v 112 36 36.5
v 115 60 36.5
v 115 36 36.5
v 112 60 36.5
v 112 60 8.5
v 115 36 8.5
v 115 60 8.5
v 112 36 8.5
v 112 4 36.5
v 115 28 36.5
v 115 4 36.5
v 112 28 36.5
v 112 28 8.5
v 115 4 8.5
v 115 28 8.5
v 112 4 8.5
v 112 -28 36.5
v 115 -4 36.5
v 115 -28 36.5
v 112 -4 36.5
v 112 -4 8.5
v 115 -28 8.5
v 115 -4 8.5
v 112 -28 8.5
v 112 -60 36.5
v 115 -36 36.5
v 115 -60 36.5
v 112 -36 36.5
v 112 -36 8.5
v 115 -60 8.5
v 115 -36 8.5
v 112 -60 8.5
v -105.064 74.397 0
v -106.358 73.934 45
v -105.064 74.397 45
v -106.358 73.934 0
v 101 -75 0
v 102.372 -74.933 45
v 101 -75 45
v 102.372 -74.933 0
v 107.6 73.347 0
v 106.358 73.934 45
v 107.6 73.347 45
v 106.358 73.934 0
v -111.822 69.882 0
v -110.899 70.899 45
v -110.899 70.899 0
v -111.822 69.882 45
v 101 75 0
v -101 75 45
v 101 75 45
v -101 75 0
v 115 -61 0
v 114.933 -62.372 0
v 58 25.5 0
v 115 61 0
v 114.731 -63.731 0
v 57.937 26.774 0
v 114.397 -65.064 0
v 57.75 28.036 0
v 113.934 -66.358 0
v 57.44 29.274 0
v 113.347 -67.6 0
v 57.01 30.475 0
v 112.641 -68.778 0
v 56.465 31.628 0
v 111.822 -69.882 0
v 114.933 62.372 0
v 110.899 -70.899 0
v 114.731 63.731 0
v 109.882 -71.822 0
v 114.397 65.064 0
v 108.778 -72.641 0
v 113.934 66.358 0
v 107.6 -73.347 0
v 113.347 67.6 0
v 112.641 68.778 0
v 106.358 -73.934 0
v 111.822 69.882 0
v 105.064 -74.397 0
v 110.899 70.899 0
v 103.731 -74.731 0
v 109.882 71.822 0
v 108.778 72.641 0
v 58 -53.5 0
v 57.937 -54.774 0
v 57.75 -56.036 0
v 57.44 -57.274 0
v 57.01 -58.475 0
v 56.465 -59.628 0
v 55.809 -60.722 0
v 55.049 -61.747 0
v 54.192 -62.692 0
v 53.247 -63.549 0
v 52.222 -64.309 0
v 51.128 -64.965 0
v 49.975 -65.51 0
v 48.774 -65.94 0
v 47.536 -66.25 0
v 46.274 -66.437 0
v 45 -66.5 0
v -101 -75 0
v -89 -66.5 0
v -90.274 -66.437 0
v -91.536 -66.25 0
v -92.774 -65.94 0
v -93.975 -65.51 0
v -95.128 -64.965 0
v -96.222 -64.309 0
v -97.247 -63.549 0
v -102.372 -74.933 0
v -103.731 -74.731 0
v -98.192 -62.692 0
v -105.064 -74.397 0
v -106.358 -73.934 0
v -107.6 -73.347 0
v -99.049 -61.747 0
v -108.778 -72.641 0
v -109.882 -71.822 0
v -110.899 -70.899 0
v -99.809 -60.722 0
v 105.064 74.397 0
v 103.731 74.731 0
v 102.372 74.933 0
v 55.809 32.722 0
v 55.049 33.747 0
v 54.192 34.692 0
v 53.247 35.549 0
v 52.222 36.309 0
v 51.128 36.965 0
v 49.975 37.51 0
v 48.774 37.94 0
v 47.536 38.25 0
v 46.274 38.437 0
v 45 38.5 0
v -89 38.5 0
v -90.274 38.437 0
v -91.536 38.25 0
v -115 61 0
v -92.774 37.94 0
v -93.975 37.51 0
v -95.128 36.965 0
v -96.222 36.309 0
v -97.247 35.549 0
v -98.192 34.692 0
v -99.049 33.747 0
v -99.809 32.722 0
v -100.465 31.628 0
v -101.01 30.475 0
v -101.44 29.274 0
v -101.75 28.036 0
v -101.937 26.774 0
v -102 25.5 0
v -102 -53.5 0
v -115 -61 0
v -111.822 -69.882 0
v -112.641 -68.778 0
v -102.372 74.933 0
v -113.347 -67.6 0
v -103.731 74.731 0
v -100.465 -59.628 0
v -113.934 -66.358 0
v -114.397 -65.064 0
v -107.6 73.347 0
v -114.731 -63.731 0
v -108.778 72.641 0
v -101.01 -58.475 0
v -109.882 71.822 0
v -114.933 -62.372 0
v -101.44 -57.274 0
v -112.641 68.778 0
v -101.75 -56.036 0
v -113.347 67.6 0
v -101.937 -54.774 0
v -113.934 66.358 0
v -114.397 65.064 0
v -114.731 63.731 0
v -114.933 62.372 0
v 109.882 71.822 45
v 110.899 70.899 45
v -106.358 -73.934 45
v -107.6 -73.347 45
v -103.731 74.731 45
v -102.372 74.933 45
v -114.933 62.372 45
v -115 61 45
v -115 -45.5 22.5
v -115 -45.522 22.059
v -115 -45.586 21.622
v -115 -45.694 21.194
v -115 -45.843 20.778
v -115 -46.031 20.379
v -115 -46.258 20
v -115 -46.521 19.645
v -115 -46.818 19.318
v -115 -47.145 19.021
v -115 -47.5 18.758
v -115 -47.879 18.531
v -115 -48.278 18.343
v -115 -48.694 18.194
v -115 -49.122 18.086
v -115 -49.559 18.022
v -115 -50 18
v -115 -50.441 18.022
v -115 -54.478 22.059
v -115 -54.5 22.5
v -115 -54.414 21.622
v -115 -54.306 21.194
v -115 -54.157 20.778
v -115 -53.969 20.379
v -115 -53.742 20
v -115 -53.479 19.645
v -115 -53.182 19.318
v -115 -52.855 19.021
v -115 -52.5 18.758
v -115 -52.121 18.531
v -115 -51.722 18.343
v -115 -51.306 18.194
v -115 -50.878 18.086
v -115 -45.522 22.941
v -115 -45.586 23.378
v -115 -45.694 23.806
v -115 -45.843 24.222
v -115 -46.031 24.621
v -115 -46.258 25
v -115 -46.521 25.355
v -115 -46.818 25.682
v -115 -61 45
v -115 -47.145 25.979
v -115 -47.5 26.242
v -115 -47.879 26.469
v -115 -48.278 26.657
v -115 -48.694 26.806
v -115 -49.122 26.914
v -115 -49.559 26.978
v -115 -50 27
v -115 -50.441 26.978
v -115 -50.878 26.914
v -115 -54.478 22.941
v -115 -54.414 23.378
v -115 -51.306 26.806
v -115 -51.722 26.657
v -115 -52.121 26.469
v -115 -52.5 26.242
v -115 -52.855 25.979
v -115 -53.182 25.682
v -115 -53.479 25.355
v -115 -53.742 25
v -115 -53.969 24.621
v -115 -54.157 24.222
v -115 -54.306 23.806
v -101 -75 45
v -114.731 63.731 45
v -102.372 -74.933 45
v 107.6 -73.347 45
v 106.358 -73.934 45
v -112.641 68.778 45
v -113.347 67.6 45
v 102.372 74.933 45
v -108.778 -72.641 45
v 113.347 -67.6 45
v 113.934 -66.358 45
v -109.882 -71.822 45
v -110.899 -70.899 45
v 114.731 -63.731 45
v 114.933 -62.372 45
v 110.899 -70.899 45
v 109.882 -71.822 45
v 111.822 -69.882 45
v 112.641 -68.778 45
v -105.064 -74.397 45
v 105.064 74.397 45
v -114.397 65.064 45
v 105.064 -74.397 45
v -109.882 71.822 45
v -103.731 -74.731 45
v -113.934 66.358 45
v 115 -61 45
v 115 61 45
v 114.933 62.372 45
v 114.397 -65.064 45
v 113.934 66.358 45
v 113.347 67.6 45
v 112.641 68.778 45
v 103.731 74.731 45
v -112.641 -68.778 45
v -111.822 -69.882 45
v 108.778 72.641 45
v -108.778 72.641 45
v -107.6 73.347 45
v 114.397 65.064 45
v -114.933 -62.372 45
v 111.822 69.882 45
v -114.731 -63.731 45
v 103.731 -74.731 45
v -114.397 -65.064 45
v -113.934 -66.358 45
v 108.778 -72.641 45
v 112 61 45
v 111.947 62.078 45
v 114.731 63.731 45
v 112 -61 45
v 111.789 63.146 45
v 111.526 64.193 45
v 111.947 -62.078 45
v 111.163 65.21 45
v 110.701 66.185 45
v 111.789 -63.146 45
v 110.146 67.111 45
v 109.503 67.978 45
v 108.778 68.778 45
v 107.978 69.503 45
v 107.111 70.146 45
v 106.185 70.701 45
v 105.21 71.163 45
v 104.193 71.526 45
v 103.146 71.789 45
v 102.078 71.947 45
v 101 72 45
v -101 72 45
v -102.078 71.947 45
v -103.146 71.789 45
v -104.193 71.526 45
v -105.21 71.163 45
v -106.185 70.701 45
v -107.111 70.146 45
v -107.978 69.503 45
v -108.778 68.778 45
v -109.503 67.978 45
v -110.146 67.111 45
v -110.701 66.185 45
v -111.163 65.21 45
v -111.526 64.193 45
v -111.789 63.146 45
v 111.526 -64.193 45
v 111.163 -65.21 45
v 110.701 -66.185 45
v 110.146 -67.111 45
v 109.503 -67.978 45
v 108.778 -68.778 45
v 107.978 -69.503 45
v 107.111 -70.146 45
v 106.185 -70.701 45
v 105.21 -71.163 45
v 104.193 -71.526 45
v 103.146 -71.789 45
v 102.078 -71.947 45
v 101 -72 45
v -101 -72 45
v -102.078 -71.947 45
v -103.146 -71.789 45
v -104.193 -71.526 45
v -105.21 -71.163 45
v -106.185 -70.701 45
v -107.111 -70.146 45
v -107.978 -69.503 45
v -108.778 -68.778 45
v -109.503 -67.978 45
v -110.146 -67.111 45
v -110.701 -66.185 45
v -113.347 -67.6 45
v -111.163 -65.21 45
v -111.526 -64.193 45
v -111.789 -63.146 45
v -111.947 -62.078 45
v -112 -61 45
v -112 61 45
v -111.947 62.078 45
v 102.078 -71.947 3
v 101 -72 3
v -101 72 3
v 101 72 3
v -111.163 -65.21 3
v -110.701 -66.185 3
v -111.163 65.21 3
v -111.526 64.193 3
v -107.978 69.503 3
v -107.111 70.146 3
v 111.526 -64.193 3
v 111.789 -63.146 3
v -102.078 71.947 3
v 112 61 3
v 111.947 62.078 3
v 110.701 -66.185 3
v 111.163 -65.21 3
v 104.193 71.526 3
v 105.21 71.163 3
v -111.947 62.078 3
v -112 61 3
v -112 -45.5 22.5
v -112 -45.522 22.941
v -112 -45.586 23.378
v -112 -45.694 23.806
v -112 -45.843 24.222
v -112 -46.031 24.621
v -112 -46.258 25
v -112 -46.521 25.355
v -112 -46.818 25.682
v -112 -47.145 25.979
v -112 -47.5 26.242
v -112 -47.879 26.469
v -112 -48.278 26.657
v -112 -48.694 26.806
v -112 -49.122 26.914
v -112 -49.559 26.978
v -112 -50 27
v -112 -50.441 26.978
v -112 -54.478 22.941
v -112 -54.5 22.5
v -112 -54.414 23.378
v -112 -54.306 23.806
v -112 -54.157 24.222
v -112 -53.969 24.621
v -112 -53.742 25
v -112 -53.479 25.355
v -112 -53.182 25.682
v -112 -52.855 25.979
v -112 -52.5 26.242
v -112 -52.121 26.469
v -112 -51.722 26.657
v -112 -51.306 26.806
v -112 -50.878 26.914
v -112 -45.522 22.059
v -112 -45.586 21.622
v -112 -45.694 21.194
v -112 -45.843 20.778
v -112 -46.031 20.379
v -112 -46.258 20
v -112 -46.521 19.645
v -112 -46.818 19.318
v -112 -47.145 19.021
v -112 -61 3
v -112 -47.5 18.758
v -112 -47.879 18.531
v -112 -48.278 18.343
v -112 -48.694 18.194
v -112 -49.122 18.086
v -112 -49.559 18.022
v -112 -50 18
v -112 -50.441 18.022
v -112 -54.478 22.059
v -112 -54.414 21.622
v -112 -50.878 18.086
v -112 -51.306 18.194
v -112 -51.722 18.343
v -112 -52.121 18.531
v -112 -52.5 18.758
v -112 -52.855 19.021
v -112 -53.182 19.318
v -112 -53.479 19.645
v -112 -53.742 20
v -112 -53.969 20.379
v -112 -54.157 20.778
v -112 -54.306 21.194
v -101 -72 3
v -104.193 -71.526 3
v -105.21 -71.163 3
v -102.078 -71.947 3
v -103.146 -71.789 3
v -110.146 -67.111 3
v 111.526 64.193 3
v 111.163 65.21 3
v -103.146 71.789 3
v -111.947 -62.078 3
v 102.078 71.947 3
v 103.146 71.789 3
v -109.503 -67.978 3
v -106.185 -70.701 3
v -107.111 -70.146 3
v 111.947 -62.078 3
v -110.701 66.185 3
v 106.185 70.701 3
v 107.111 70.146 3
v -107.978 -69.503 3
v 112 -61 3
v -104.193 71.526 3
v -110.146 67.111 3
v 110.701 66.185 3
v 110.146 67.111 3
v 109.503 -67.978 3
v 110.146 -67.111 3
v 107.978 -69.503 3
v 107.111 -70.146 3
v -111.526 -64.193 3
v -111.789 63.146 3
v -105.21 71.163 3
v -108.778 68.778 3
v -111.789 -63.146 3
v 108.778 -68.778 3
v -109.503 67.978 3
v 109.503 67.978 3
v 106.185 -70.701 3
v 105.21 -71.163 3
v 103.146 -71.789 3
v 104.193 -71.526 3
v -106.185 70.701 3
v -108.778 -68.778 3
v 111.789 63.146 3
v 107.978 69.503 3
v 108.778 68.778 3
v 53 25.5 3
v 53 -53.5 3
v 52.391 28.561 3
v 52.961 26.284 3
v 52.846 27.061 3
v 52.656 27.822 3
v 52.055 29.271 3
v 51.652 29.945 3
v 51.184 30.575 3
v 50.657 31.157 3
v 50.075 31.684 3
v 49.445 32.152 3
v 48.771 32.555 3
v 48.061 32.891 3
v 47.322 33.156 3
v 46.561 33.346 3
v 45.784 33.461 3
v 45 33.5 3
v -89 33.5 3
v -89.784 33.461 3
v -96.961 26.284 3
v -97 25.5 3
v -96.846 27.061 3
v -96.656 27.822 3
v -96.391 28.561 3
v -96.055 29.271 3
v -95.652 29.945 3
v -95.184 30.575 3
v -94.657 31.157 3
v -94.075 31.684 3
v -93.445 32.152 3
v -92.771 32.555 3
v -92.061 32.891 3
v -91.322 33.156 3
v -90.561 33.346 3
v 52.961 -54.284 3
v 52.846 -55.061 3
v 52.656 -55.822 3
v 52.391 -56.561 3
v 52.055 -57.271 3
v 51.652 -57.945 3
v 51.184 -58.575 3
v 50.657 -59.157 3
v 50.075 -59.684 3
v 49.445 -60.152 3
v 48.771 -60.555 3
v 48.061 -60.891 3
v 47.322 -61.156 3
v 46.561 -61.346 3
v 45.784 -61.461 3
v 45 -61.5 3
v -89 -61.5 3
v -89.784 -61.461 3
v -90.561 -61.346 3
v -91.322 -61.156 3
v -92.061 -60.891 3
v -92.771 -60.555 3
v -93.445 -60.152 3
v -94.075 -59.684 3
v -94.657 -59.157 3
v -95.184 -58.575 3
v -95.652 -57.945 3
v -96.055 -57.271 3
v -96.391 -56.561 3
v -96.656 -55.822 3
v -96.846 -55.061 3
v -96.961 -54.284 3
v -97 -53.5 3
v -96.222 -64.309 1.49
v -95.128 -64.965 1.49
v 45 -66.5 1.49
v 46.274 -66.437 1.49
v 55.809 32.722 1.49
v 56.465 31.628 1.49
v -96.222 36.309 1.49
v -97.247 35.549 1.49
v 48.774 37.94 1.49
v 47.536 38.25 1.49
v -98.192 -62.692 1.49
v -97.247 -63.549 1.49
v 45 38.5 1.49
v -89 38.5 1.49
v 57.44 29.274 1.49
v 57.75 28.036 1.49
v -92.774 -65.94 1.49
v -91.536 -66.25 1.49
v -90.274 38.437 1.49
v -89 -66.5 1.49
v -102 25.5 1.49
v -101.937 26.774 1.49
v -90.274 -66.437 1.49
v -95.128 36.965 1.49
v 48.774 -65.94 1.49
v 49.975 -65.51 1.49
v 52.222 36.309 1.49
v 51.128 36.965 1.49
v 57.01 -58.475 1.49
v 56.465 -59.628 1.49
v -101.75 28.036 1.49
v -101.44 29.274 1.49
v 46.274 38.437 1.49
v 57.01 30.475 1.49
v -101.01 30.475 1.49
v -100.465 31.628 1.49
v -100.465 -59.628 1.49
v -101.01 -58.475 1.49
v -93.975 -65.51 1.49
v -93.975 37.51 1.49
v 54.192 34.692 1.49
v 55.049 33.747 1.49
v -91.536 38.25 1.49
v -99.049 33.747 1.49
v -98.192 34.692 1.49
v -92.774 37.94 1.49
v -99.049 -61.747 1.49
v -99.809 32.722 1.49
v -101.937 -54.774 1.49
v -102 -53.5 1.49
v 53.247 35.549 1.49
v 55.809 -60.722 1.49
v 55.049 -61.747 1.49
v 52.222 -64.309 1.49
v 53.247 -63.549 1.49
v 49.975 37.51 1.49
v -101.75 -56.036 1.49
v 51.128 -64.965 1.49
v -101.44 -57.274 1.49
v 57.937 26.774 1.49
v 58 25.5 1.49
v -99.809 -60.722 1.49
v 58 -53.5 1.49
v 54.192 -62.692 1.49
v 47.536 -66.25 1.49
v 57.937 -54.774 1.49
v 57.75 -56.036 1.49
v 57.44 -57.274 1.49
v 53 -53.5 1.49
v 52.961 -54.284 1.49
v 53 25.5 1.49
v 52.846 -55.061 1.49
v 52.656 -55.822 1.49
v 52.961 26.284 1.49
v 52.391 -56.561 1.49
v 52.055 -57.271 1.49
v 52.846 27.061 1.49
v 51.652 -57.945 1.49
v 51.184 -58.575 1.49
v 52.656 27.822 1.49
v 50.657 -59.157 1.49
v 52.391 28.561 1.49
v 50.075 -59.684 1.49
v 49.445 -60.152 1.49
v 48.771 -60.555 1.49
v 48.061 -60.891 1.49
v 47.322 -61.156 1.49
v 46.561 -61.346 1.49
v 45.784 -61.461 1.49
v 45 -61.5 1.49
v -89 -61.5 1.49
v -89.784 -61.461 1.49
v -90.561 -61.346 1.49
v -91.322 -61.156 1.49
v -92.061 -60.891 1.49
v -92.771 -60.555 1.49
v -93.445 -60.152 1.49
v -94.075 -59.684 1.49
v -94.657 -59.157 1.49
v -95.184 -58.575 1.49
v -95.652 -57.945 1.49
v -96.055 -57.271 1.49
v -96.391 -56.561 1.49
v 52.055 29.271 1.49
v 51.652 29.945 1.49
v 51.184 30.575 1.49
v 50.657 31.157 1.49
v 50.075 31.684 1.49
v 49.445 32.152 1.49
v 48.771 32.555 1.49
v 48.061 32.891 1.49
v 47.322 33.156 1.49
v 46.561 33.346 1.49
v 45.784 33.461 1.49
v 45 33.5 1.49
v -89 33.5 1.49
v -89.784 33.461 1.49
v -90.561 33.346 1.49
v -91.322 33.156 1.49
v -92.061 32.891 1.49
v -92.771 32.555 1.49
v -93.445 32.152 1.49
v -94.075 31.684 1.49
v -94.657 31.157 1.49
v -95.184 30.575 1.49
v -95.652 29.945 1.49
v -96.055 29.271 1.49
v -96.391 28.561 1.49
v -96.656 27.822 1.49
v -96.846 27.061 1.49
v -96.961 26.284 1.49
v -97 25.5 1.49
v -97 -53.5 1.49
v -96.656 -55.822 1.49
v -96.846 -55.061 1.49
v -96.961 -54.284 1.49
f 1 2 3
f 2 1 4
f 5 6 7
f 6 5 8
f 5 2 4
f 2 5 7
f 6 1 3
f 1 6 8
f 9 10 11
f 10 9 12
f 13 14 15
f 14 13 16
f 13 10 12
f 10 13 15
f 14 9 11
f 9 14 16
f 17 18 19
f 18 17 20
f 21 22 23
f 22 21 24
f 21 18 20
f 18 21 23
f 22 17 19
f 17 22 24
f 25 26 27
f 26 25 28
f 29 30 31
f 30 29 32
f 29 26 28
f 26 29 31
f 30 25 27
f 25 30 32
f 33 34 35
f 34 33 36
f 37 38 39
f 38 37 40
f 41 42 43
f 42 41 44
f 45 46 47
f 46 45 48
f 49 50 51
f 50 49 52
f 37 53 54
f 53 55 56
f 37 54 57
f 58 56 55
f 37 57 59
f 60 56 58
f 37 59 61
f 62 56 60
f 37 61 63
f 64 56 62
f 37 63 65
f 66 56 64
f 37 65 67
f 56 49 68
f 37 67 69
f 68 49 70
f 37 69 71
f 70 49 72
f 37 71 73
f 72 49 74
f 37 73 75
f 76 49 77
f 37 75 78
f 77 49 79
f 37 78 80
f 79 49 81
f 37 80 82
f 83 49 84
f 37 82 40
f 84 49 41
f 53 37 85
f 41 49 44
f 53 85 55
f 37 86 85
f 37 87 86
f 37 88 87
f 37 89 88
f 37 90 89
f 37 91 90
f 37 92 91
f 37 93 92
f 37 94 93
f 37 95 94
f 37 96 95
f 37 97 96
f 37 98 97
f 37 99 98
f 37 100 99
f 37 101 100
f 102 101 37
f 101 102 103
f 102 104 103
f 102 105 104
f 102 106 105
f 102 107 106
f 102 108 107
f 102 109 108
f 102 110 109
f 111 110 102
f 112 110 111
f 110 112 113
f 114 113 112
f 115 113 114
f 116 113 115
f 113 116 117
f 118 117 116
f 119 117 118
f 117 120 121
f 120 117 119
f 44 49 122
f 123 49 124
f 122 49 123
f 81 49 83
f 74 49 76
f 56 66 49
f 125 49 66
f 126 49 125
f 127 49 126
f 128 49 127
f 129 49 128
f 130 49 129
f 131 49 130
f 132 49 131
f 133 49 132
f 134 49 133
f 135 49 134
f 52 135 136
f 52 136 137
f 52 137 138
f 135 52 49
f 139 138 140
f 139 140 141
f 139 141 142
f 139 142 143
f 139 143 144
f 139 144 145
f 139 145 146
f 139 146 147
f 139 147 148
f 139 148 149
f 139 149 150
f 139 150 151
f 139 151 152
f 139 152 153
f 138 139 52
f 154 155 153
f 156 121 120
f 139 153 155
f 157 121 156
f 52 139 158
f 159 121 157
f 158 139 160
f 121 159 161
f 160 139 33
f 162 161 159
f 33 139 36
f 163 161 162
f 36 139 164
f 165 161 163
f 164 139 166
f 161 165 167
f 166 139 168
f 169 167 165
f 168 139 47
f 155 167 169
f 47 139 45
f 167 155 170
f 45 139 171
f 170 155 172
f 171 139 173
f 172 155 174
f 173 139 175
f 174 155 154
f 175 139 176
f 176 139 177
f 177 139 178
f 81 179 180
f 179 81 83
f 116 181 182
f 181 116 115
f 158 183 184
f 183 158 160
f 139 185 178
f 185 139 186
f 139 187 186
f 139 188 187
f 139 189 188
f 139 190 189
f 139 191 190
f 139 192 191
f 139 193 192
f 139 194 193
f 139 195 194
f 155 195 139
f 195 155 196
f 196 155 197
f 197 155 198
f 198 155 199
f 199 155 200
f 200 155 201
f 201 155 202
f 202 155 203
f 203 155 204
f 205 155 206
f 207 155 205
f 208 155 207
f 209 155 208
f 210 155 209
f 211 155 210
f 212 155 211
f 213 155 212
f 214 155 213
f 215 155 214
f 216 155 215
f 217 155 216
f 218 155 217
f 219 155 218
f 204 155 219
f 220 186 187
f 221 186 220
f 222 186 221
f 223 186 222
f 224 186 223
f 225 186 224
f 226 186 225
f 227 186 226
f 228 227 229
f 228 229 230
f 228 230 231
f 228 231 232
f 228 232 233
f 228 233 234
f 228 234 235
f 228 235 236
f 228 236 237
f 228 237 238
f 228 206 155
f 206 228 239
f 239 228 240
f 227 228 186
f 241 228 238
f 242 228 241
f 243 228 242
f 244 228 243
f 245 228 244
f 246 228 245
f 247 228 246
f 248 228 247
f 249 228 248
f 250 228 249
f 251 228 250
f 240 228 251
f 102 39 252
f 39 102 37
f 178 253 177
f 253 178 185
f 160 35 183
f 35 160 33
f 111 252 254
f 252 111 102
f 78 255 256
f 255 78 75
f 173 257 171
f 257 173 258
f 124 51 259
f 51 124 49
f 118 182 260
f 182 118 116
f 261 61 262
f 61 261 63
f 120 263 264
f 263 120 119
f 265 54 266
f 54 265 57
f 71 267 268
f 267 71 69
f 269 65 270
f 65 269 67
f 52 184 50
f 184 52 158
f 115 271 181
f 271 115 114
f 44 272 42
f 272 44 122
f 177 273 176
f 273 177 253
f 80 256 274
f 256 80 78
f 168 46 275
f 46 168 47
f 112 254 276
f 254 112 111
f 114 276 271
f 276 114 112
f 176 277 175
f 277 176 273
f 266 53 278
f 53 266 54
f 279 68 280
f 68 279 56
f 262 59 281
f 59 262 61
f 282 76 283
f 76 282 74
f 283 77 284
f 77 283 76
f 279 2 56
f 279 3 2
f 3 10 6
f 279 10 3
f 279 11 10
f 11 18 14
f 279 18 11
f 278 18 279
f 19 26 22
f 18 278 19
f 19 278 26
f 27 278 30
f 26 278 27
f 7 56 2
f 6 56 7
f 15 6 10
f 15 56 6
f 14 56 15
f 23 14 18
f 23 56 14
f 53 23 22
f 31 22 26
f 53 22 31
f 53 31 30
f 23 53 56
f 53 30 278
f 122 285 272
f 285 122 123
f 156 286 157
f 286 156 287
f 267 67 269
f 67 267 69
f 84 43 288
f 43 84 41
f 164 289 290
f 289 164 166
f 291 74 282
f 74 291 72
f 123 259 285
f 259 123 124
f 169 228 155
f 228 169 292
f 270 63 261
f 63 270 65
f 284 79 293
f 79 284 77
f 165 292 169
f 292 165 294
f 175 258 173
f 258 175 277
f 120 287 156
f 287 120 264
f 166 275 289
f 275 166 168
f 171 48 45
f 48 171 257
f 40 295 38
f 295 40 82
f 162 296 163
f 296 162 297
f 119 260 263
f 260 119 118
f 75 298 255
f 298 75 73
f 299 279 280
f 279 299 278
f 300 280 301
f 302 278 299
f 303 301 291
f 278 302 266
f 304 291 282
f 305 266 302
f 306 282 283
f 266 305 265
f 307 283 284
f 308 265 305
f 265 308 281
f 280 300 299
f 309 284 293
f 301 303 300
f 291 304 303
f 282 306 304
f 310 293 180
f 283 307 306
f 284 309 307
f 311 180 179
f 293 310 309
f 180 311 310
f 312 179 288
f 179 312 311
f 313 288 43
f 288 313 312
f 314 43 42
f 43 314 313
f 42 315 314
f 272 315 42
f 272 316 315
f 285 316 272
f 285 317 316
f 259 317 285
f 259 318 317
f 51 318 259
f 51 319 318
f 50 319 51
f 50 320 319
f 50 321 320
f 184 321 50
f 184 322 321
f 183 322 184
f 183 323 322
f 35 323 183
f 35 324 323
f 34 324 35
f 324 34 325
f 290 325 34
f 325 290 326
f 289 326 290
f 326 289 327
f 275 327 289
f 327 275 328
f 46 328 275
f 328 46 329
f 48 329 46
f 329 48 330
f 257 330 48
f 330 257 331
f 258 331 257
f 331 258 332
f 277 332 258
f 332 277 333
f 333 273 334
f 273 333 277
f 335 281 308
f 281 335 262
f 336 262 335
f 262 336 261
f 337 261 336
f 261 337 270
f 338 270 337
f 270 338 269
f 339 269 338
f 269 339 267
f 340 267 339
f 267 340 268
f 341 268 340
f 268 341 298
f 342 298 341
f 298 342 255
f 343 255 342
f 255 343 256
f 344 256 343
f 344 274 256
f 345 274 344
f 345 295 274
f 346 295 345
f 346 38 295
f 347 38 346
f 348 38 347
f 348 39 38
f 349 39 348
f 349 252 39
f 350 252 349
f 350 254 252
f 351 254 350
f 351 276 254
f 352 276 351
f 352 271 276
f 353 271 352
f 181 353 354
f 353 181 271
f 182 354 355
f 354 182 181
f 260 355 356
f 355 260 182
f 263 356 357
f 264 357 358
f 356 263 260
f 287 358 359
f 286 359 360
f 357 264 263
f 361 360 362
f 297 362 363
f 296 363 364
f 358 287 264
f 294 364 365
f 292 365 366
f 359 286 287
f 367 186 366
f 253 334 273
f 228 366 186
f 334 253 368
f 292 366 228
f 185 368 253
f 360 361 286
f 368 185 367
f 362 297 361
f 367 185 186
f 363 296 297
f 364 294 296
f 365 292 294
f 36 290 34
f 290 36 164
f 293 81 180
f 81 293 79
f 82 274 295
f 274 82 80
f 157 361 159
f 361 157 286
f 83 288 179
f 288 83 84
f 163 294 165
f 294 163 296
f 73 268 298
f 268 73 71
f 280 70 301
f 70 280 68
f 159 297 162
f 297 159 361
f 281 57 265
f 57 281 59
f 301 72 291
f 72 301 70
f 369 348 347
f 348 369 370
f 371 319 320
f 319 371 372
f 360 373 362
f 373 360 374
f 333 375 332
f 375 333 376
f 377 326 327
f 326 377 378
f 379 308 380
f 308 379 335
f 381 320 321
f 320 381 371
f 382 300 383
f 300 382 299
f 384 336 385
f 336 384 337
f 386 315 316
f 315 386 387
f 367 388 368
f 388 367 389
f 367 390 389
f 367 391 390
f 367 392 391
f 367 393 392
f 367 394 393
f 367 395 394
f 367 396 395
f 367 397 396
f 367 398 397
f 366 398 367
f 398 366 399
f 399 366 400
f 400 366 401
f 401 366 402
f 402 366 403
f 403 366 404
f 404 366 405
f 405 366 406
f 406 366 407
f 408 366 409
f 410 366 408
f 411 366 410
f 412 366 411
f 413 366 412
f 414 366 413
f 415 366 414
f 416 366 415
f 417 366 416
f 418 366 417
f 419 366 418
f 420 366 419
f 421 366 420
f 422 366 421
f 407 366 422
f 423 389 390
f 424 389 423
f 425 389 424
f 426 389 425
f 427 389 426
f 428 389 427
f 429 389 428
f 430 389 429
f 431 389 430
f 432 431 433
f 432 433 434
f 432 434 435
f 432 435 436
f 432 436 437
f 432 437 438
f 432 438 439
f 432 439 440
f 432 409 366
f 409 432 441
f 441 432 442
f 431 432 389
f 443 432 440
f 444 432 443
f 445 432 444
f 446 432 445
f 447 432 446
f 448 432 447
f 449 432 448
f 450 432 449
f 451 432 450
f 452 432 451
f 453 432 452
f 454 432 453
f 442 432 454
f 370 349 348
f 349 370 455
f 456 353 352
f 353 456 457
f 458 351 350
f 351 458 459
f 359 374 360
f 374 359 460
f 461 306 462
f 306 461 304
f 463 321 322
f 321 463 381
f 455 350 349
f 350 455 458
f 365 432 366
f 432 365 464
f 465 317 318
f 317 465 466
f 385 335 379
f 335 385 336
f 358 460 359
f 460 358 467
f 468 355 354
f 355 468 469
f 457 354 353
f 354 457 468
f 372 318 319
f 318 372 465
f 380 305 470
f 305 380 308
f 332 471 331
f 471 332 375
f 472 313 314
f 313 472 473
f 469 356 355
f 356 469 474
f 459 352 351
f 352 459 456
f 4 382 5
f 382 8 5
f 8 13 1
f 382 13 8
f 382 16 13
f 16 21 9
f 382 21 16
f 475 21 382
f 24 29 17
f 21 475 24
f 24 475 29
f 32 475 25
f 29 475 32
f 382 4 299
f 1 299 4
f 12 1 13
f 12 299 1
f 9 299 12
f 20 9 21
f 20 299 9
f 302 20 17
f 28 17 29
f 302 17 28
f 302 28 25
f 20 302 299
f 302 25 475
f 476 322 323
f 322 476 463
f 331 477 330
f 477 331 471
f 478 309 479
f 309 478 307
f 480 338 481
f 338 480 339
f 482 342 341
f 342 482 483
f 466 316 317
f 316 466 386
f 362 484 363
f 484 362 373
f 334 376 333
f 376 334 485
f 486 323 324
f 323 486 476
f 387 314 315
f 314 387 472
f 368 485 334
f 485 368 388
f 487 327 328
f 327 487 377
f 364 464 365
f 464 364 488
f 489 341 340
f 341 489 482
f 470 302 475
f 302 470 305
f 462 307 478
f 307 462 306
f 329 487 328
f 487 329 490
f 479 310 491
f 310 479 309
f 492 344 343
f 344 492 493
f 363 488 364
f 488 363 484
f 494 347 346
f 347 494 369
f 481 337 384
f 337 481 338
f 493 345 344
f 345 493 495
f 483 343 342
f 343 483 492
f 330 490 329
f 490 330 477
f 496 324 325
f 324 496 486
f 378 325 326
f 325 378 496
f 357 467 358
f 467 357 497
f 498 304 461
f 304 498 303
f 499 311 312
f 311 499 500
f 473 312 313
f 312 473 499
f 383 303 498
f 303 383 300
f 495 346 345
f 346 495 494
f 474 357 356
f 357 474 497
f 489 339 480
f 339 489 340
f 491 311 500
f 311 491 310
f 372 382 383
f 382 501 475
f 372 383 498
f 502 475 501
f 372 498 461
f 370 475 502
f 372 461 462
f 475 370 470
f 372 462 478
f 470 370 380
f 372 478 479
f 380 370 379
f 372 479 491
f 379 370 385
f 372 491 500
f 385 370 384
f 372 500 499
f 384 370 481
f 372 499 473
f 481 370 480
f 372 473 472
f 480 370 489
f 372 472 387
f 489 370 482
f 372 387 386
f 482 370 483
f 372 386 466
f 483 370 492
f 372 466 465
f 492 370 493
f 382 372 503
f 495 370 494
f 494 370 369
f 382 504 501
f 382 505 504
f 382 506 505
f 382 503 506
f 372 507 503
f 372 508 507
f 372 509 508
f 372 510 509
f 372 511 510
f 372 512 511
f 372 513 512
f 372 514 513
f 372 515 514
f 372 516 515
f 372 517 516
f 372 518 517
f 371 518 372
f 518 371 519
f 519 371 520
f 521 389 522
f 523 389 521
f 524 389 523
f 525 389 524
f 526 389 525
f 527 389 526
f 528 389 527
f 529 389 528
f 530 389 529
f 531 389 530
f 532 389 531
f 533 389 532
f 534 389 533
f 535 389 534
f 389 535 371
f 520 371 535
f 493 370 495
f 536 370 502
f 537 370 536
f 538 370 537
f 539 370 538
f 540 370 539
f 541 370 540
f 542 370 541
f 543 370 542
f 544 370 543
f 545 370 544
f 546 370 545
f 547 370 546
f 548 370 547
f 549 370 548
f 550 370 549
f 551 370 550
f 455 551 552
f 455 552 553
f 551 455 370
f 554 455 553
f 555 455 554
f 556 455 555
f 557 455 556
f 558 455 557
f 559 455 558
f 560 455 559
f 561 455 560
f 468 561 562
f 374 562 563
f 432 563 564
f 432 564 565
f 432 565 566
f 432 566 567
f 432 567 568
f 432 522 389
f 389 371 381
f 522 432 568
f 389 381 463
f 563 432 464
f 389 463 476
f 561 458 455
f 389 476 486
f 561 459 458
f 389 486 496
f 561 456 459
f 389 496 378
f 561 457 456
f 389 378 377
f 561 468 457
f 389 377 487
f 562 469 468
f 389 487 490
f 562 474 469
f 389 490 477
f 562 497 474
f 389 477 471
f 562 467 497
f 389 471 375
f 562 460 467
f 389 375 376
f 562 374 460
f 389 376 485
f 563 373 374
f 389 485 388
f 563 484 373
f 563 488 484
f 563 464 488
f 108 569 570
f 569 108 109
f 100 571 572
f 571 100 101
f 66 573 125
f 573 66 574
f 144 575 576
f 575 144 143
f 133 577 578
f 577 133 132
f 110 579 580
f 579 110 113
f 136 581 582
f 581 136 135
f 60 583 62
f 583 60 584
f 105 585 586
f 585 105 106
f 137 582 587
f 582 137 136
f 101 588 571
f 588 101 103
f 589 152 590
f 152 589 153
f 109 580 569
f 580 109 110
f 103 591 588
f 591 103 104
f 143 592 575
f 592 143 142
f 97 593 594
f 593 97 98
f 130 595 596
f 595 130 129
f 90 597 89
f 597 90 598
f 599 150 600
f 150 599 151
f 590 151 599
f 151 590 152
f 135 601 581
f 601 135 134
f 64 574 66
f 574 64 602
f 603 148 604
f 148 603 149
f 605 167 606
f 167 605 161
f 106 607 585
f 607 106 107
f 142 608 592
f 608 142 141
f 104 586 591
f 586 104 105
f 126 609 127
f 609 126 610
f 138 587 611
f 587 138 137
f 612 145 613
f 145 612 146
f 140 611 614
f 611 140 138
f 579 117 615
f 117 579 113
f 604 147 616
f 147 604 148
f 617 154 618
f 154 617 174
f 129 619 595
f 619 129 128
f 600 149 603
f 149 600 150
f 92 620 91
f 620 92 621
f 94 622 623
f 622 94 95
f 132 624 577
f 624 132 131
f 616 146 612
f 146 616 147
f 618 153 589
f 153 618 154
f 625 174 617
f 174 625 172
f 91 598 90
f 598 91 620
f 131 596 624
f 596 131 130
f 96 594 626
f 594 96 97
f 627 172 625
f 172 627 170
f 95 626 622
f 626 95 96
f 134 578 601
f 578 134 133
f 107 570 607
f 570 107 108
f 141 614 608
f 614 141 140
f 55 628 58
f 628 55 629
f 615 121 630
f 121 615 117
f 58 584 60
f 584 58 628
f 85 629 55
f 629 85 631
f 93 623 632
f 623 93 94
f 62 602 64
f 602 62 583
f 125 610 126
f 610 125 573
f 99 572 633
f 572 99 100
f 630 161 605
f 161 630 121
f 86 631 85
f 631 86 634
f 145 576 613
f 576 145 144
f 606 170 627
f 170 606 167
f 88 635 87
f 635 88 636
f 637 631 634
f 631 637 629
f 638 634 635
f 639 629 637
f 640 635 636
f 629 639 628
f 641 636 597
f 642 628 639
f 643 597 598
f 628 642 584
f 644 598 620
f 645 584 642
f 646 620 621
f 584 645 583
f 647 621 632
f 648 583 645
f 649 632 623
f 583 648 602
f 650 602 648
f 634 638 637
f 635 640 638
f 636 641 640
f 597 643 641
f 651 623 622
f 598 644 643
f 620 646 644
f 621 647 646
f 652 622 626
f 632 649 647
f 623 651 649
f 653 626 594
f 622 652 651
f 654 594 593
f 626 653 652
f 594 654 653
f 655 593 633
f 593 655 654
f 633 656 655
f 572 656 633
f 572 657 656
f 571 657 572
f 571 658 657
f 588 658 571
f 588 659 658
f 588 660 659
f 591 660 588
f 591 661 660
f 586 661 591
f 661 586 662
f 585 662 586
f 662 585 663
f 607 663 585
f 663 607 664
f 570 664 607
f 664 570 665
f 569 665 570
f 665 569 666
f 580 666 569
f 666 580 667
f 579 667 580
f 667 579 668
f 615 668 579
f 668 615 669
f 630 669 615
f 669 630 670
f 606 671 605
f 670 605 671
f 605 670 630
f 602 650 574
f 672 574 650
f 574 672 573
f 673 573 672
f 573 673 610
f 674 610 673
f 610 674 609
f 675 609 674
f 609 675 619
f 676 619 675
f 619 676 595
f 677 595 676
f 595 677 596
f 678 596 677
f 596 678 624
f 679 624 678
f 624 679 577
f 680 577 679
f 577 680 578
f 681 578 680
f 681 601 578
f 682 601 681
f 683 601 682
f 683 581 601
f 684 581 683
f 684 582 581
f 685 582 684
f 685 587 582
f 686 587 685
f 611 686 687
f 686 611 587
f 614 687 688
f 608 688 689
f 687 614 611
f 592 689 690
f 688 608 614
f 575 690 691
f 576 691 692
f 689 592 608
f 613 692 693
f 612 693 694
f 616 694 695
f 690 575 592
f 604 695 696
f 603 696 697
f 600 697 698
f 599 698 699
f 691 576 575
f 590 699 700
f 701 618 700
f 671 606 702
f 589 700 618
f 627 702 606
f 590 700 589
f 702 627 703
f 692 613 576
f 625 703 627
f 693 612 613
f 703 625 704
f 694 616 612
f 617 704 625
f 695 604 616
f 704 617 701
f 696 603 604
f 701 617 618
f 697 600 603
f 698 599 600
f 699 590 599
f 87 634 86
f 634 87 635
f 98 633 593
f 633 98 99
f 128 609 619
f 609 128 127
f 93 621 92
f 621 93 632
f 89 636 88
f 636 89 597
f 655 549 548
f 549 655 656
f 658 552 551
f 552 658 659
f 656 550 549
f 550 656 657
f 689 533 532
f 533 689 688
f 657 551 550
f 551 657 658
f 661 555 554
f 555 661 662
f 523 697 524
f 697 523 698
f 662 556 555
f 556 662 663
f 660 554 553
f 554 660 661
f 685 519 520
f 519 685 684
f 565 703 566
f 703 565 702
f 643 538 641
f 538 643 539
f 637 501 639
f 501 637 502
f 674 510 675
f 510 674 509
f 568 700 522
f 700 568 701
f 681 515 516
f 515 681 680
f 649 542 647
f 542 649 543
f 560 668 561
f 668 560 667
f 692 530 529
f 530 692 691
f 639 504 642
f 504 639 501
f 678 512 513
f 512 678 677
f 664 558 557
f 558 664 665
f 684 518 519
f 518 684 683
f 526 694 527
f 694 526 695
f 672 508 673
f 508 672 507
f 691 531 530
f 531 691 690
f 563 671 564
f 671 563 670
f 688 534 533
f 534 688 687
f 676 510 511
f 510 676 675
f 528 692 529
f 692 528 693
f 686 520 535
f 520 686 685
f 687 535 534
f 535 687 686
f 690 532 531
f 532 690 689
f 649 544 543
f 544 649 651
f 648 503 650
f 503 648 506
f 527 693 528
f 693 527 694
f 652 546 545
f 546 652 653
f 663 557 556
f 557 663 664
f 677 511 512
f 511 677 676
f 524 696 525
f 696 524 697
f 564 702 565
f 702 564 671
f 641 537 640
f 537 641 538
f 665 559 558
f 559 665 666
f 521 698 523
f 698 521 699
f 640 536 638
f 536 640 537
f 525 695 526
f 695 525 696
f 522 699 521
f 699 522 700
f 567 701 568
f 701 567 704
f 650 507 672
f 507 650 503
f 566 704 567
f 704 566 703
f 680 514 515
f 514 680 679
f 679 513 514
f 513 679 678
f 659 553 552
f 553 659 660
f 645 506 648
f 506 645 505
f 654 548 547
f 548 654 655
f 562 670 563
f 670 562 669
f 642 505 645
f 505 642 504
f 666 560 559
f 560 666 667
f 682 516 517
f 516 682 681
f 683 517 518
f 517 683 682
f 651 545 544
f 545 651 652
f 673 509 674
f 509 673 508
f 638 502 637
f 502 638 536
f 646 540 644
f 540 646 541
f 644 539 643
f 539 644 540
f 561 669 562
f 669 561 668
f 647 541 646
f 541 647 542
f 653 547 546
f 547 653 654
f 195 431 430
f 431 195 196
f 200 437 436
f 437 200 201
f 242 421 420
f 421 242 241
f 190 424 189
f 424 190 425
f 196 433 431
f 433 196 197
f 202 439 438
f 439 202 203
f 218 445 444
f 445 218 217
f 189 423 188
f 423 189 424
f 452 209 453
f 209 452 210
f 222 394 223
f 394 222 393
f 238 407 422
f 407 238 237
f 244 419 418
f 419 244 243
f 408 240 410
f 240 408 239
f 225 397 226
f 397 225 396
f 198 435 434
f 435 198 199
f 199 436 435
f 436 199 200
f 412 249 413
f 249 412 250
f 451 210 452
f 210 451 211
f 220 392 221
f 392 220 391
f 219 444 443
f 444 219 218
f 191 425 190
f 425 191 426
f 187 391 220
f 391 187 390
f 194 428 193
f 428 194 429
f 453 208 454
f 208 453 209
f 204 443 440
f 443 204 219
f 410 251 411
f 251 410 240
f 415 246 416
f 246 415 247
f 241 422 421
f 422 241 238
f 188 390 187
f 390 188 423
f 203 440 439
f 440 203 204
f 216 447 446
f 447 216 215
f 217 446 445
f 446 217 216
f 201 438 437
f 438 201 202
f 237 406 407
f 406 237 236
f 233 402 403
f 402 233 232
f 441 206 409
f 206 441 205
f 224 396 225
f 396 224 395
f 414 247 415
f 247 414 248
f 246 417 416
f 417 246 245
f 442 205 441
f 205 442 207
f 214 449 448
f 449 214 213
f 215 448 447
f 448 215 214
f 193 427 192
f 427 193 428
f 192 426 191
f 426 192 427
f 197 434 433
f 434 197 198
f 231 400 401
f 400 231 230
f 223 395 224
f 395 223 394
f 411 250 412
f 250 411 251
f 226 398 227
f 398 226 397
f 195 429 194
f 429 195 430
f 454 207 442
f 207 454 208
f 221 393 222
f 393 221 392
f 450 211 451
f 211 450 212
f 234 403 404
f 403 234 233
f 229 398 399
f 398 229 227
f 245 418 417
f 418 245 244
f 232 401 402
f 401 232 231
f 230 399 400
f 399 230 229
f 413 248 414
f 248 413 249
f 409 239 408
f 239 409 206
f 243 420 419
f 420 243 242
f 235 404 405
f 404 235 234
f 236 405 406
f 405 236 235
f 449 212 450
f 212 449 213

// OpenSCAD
// =============================================================================
// pear_pie_hub.scad  -  Pear Pie hub housing, clip-in module, cap, vacuum buck
// =============================================================================
// Set PART to choose what renders:
//   "hub"        -> housing: off-centre RECTANGULAR screen + side module bays
//   "module"     -> a hollow clip-in module (magnetic mount, cable hole, open top)
//   "module_cap" -> the press-on lid for a module
//   "buck"       -> vacuum-forming mould for a RECTANGULAR bulged screen cover
//
// USE: install OpenSCAD (openscad.org), open file, set PART, F5 preview / F6
// render, Export as STL. All dimensions are variables below - change and re-render.
// Units: millimetres.
//
// MOUNTING: modules mount MAGNETICALLY (magnet pockets in both module + hub bay).
// COMMS: modules talk to the hub over BLE (no electrical pins to align).
// The full wired SPI bus is documented as the architecture; demo modules use
// magnetic-mount + BLE, which is simpler and matches the wireless mesh design.
// =============================================================================

PART = "hub";          // "hub", "module", "module_cap", or "buck"
$fn  = 64;

// --- HUB BODY -----------------------------------------------------------------
BODY_W   = 230;  BODY_H = 150;  BODY_D = 45;  WALL = 3;  CORNER_R = 14;

// --- SCREEN WINDOW (off-centre, RECTANGULAR to match the Inky content) --------
SCREEN_W = 150;  SCREEN_H = 95;  SCREEN_R = 8;
SCREEN_OFF_X = -22;   // left
SCREEN_OFF_Y = -14;   // down
BEZEL_W = 5;  BEZEL_DEPTH = 1.5;

// --- MODULE BAYS (clip-in points down the right edge) -------------------------
MOD_COUNT = 4;  MOD_SLOT_H = 24;  MOD_SLOT_Z = 28;  MOD_SLOT_DEPTH = 14;  MOD_GAP = 8;

// --- MAGNETS (small disc magnets in module + matching hub pockets) ------------
MAG_D = 6;   MAG_T = 2.5;        // 6mm dia x 2.5mm magnets (common)

// --- MODULE INTERNALS ---------------------------------------------------------
MOD_FACE_OUT = 18;               // how far the module body sticks out from the hub
MOD_WALL     = 2;                // module shell wall
PWR_LEAD_D   = 7;                // power lead hole in the module (rear)

// --- VACUUM BUCK (rectangular bulged cover to match the screen) ---------------
BUCK_W = 150;  BUCK_H = 95;  BUCK_R = 8;   // match the screen window
BULGE  = 18;   DRAFT = 0.88;   FLANGE_W = 12;  FLANGE_T = 4;  VENT_D = 2;

// --- POWER LEAD HOLES ---------------------------------------------------------
PWR_D        = 9;                // main power lead hole (e.g. USB-C / barrel)
PWR_BAY_D    = 6;                // smaller power feed into each module bay

// =============================================================================
module rrect(w, h, r) { offset(r) square([w - 2*r, h - 2*r], center = true); }

// magnet pockets, two per bay/module, placed in the mating face (in Y/Z plane)
module mag_pockets_in_x_face(face_x, depth_dir) {
    // two magnets spaced in Z, centred in the bay height
    for (dz = [-MOD_SLOT_Z/4, MOD_SLOT_Z/4])
        translate([face_x, 0, dz])
            rotate([0, 90 * depth_dir, 0])
                cylinder(d = MAG_D, h = MAG_T + 0.5);
}

// =============================================================================
// HUB HOUSING
// =============================================================================
module hub() {
    total  = MOD_COUNT * MOD_SLOT_H + (MOD_COUNT - 1) * MOD_GAP;
    start_y = total/2 - MOD_SLOT_H/2;
    difference() {
        linear_extrude(BODY_D) rrect(BODY_W, BODY_H, CORNER_R);

        // hollow, open back
        translate([0, 0, WALL])
            linear_extrude(BODY_D)
                rrect(BODY_W - 2*WALL, BODY_H - 2*WALL, max(1, CORNER_R - WALL));

        // recessed bezel
        translate([SCREEN_OFF_X, SCREEN_OFF_Y, -0.01])
            linear_extrude(BEZEL_DEPTH)
                rrect(SCREEN_W + 2*BEZEL_W, SCREEN_H + 2*BEZEL_W, SCREEN_R + BEZEL_W);

        // screen window through the front wall
        translate([SCREEN_OFF_X, SCREEN_OFF_Y, -1])
            linear_extrude(WALL + 2) rrect(SCREEN_W, SCREEN_H, SCREEN_R);

        // module bays + magnet pockets in each bay floor
        for (i = [0 : MOD_COUNT - 1]) {
            y = start_y - i * (MOD_SLOT_H + MOD_GAP);
            // the bay opening
            translate([BODY_W/2 - MOD_SLOT_DEPTH, y - MOD_SLOT_H/2, (BODY_D - MOD_SLOT_Z)/2])
                cube([MOD_SLOT_DEPTH + 1, MOD_SLOT_H, MOD_SLOT_Z]);
            // magnet pockets in the inner wall of the bay (module pulls against these)
            translate([0, y, BODY_D/2])
                for (dz = [-MOD_SLOT_Z/4, MOD_SLOT_Z/4])
                    translate([BODY_W/2 - MOD_SLOT_DEPTH - MAG_T, 0, dz])
                        rotate([0, 90, 0]) cylinder(d = MAG_D, h = MAG_T + 0.5);
            // power feed hole from inside the hub into this bay
            translate([BODY_W/2 - MOD_SLOT_DEPTH - WALL - 1, y, BODY_D/2])
                rotate([0, 90, 0]) cylinder(d = PWR_BAY_D, h = WALL + 2);
        }

        // main power lead hole in the hub body (back-left, for the Pi supply)
        translate([-BODY_W/2 - 1, -BODY_H/2 + 25, BODY_D/2])
            rotate([0, 90, 0]) cylinder(d = PWR_D, h = WALL + 2);
    }
}

// =============================================================================
// CLIP-IN MODULE  (hollow, magnetic mount, cable hole, open top for the cap)
// =============================================================================
module module_block() {
    tab_d = MOD_SLOT_DEPTH - 0.5;     // insert tab (clearance)
    w     = MOD_FACE_OUT + tab_d;     // total depth (into hub + sticking out)
    h     = MOD_SLOT_H - 0.8;
    z     = MOD_SLOT_Z - 0.8;

    difference() {
        // outer shell
        translate([0, -h/2, -z/2])
            minkowski() { cube([w, h, z]); sphere(1.2); }

        // hollow cavity (open at the TOP, +Y, for the cap)
        translate([MOD_WALL, -h/2 + MOD_WALL, -z/2 + MOD_WALL])
            cube([w - 2*MOD_WALL, h, z - 2*MOD_WALL]);   // runs out the top = open

        // magnet pockets in the insert face (meets the hub bay)
        for (dz = [-z/4, z/4])
            translate([-0.5, 0, dz]) rotate([0, 90, 0]) cylinder(d = MAG_D, h = MAG_T + 0.5);

        // power lead hole out the back of the module
        translate([w - MOD_WALL - 1, 0, 0]) rotate([0, 90, 0]) cylinder(d = PWR_LEAD_D, h = MOD_WALL + 2);
    }
}

// =============================================================================
// MODULE CAP  (press-on lid for the module's open top)
// =============================================================================
module module_cap() {
    tab_d = MOD_SLOT_DEPTH - 0.5;
    w     = MOD_FACE_OUT + tab_d;
    z     = MOD_SLOT_Z - 0.8;
    lip   = 2;
    // flat lid + a small inner lip that presses into the cavity
    union() {
        translate([0, 0, -z/2]) cube([w, 1.6, z]);                       // lid plate
        translate([MOD_WALL + 0.3, -lip, -z/2 + MOD_WALL + 0.3])
            cube([w - 2*MOD_WALL - 0.6, lip, z - 2*MOD_WALL - 0.6]);     // press lip
    }
}

// =============================================================================
// VACUUM BUCK  (rectangular bulged cover, draft + radii + vents)
// =============================================================================
module buck() {
    LAYERS = 40;                       // smoothness of the pillow bulge
    union() {
        // flat flange to seal + trim against
        linear_extrude(FLANGE_T)
            rrect(BUCK_W + 2*FLANGE_W, BUCK_H + 2*FLANGE_W, BUCK_R + FLANGE_W);

        difference() {
            // RECTANGULAR pillow bulge: stack shrinking rounded-rects up a sine
            // curve, so the dome keeps its rectangular shape (not a round hump)
            translate([0, 0, FLANGE_T - 0.01])
                for (i = [0 : LAYERS - 1]) {
                    f0 = i / LAYERS;
                    f1 = (i + 1) / LAYERS;
                    z0 = BULGE * sin(f0 * 90);    // sine profile = soft rounded top
                    z1 = BULGE * sin(f1 * 90);
                    s0 = 1 - (1 - DRAFT) * f0;     // shrink toward top = draft
                    s1 = 1 - (1 - DRAFT) * f1;
                    translate([0, 0, z0])
                        linear_extrude(height = max(z1 - z0, 0.01), scale = s1 / s0)
                            rrect(BUCK_W * s0, BUCK_H * s0, BUCK_R * s0);
                }

            // vent holes through the dome (air pulled out during forming)
            for (vx = [-BUCK_W/2 + 12, 0, BUCK_W/2 - 12])
                for (vy = [-BUCK_H/2 + 12, BUCK_H/2 - 12])
                    translate([vx, vy, -1]) cylinder(d = VENT_D, h = BULGE + FLANGE_T + 4);
        }
    }
}

// =============================================================================
if (PART == "hub")             hub();
else if (PART == "module")     module_block();
else if (PART == "module_cap") module_cap();
else if (PART == "buck")       buck();
